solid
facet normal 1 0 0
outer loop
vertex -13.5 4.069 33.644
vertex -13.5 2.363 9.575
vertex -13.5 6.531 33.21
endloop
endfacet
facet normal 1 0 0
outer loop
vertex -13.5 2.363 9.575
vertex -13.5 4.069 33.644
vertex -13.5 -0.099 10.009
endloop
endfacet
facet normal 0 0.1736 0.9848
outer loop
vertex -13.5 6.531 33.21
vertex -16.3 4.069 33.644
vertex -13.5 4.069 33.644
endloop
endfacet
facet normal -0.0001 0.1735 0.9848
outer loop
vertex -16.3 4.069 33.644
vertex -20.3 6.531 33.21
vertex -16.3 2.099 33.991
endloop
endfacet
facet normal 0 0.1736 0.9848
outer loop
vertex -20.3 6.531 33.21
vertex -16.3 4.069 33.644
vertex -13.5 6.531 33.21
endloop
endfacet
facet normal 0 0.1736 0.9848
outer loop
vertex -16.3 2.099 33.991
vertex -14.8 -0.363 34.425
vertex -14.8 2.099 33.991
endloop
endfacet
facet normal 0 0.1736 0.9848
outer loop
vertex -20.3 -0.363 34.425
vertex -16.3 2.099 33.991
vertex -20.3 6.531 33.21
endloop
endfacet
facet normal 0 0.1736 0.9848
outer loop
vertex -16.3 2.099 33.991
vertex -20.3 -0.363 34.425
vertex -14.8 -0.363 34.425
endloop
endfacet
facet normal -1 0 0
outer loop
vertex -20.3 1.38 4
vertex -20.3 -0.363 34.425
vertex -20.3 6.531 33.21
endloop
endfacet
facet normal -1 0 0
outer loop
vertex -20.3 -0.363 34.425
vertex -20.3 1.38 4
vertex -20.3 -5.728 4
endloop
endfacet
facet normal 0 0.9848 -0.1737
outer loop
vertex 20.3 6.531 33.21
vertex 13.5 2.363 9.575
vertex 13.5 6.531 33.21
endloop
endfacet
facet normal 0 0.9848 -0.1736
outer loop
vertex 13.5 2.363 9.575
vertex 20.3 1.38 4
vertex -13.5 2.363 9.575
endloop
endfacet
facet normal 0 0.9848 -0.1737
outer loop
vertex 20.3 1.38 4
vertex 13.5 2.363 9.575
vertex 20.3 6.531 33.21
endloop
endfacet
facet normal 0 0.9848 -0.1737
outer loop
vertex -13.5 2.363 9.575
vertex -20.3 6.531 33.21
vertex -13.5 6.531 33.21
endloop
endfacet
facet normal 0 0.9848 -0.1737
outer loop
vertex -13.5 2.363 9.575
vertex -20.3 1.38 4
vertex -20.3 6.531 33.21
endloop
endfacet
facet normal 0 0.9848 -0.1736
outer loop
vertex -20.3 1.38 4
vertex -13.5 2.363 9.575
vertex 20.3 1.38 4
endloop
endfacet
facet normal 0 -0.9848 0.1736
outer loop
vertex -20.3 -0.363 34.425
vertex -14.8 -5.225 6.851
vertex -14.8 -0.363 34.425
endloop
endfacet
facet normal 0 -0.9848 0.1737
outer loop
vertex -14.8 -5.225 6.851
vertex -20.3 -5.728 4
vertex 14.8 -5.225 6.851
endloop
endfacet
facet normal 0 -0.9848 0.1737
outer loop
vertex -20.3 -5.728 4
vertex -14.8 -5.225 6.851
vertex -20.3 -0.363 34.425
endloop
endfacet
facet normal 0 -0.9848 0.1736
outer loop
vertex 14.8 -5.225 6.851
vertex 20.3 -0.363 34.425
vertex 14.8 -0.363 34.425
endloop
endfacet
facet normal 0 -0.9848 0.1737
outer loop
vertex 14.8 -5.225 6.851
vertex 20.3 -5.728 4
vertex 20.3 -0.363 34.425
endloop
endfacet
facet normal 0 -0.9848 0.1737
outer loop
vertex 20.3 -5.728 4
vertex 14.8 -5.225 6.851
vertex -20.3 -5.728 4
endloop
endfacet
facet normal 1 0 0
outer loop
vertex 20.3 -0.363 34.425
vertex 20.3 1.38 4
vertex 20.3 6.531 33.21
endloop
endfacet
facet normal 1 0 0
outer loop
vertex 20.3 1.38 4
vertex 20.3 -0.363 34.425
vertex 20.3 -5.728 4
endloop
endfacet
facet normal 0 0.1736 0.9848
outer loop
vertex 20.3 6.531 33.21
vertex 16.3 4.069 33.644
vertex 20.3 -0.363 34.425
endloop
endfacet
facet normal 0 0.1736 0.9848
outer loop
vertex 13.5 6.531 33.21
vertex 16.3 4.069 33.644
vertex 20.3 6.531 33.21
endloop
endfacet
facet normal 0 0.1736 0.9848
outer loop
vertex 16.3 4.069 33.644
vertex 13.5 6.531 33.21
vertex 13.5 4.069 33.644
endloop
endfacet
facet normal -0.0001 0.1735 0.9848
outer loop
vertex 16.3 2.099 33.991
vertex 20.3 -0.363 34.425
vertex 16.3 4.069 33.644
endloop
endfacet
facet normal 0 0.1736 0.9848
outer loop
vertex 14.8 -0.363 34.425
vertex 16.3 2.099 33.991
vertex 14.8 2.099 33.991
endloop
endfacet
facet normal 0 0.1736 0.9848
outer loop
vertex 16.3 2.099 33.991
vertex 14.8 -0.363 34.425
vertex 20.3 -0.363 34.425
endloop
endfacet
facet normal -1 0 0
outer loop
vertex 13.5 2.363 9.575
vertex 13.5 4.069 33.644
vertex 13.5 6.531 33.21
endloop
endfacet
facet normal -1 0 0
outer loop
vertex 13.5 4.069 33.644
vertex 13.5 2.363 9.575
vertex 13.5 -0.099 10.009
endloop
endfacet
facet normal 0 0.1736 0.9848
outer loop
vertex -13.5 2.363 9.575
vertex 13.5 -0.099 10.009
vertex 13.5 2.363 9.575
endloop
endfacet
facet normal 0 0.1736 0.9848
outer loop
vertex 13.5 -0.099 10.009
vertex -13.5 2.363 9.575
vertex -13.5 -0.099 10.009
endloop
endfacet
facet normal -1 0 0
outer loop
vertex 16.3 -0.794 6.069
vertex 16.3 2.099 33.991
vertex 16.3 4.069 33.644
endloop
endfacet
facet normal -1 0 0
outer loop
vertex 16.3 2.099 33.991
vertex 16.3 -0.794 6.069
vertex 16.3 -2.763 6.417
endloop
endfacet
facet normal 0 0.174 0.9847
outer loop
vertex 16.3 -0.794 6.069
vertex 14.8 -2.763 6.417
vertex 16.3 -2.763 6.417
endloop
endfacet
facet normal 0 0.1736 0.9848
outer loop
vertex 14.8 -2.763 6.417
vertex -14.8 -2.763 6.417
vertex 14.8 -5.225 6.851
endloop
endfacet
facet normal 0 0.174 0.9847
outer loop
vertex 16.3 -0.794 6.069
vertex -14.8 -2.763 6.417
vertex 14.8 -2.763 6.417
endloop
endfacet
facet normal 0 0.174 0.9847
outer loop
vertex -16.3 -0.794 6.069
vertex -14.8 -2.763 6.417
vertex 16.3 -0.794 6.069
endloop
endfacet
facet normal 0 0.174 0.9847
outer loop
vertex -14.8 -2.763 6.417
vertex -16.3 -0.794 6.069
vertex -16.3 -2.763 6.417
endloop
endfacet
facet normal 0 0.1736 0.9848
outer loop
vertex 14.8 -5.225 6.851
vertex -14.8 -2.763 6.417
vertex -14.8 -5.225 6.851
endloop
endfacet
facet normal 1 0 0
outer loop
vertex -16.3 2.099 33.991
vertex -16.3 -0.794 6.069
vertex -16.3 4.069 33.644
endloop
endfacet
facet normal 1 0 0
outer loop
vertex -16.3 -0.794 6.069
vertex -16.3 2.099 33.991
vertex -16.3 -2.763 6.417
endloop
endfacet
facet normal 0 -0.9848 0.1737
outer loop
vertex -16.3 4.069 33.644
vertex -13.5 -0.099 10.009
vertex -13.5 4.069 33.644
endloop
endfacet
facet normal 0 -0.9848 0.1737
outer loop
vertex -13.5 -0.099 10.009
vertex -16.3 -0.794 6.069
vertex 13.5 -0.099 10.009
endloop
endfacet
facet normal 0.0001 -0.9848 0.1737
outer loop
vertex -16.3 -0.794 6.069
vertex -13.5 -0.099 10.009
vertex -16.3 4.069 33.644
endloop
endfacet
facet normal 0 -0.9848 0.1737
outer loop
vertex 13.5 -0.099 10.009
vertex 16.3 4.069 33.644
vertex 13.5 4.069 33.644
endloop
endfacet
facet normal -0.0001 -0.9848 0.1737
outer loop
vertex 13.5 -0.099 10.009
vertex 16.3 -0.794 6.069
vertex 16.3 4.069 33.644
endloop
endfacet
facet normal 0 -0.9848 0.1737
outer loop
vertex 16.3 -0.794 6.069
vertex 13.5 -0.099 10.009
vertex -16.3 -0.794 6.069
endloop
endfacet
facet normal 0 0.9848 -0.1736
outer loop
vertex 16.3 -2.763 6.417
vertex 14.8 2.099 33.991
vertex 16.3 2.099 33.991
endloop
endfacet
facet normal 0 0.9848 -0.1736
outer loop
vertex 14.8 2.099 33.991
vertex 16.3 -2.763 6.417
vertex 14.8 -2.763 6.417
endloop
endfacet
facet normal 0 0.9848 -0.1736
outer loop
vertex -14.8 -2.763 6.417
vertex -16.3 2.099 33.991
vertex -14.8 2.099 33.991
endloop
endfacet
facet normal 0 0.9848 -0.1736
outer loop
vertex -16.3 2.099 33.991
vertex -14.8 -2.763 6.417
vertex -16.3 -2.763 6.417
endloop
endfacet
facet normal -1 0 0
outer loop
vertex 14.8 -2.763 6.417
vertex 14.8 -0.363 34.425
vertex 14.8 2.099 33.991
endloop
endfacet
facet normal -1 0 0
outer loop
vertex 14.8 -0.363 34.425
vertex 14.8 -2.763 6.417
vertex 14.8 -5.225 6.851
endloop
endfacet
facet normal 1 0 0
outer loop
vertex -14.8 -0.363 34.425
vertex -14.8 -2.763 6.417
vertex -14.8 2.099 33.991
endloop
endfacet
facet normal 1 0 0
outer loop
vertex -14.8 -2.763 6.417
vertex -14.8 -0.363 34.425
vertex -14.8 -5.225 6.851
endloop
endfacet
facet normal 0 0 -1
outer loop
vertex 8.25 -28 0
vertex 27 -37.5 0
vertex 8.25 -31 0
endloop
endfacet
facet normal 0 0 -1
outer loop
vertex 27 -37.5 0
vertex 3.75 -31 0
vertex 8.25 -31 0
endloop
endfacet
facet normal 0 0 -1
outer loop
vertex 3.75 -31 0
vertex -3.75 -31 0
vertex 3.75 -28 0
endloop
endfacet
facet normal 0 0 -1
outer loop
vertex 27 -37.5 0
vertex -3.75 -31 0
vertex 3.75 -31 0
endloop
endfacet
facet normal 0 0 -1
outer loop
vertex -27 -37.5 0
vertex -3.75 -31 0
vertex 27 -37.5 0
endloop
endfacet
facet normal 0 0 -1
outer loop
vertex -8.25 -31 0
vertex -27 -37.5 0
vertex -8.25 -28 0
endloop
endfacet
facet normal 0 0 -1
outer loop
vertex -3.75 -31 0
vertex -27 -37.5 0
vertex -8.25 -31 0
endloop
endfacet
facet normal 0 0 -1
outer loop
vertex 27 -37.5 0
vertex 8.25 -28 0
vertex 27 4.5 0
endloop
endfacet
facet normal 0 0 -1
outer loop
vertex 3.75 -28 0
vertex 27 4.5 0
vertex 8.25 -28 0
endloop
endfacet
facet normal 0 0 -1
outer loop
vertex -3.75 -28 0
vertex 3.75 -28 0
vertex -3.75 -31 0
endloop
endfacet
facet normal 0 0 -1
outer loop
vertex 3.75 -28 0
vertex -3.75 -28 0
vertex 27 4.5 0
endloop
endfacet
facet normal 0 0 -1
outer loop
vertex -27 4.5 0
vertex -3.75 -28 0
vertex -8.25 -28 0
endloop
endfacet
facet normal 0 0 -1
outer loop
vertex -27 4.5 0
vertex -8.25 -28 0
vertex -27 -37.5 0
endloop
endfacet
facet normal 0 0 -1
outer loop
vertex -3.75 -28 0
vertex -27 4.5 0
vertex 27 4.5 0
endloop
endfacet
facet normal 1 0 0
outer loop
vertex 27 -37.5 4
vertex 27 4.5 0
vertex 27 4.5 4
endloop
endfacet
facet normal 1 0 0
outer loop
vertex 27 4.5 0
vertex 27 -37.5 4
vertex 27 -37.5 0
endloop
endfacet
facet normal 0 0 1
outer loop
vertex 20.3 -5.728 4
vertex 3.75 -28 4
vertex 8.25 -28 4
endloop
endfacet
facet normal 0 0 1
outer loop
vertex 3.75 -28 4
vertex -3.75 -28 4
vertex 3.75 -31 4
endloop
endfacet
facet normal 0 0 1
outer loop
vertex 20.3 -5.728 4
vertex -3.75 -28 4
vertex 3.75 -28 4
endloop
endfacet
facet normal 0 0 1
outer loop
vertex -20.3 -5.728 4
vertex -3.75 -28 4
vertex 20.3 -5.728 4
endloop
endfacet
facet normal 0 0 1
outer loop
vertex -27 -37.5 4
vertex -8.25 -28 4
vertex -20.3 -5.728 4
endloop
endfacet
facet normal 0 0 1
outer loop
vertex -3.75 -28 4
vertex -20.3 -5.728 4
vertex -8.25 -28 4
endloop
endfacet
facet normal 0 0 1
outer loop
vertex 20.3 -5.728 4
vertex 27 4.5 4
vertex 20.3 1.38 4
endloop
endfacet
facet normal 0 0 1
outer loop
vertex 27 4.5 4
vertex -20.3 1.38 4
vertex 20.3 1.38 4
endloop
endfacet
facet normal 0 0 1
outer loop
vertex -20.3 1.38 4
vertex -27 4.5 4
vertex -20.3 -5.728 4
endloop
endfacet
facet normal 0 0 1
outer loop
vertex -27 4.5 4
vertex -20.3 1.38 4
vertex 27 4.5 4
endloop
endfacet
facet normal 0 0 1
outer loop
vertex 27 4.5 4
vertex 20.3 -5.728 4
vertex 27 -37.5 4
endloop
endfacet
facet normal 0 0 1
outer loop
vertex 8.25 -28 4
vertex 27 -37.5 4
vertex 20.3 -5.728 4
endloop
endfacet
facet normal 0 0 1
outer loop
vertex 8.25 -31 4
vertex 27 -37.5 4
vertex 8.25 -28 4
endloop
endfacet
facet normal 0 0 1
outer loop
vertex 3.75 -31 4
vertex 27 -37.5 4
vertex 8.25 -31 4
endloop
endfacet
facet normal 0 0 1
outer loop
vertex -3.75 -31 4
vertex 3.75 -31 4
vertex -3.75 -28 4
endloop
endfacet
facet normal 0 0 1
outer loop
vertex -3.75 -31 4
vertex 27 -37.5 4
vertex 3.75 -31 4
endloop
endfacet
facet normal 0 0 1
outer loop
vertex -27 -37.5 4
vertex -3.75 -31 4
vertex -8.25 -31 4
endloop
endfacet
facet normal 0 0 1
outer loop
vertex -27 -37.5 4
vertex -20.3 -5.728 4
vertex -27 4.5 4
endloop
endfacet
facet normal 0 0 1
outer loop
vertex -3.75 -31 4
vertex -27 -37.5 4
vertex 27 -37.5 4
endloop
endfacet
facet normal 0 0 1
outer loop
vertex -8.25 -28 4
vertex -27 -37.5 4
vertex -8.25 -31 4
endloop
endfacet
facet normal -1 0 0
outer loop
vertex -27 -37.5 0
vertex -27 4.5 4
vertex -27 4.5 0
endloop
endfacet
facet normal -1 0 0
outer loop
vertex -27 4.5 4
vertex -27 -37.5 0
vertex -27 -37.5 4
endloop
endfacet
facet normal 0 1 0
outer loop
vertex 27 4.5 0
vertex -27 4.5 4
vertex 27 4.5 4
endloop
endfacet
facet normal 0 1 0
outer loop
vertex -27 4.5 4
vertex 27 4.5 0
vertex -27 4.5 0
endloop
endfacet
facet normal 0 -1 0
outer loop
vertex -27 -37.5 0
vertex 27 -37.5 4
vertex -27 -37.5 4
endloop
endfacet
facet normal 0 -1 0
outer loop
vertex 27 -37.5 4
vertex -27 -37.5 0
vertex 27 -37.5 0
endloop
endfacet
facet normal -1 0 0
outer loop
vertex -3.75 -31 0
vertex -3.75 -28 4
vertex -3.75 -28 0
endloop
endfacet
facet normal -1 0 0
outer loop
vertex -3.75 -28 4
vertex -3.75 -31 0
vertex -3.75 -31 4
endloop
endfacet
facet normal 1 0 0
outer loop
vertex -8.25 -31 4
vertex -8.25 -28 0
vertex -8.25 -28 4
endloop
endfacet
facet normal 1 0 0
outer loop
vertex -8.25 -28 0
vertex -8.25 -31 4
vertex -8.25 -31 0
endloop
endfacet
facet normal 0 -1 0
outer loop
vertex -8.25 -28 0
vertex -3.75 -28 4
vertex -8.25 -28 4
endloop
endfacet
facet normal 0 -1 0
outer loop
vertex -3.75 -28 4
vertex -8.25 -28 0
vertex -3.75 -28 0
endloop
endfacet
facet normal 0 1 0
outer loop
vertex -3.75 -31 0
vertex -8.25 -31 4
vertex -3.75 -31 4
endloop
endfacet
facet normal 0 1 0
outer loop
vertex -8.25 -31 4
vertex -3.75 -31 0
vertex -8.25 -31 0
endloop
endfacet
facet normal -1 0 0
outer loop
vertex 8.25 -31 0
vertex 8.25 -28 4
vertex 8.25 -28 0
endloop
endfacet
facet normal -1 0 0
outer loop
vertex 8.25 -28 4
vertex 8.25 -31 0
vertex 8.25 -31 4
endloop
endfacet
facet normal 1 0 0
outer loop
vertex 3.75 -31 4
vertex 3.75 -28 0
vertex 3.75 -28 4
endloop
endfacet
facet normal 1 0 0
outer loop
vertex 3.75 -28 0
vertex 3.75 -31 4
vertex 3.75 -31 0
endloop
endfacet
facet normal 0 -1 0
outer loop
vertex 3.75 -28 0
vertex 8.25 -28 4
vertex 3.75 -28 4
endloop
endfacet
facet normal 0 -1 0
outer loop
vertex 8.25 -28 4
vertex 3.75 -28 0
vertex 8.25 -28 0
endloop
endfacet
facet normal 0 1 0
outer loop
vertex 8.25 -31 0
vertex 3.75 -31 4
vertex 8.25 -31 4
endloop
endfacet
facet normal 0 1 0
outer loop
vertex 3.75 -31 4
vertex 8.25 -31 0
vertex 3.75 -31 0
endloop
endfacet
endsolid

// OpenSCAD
// Boris — support caméra latérale (InnoMaker U20CAM-720P, carte ~32x32 mm)
//
// v1 : une seule pièce, angle de plongée fixé à l'impression (imprimer 2-3 angles).
// v2 : deux pièces, berceau qui pivote sur 2 vis M3 latérales (réglage à la main,
//      serrage par friction).
//
// Principe commun : la carte caméra glisse par le haut dans deux rails rainurés
// (aucune vis dans la carte, aucun trou de fixation à connaître). Le câble est
// bridé au socle par un collier passé dans deux fentes, pour qu'il ne tire pas
// sur la carte.
//
// Repère : X = largeur, Y = axe de visée (objectif vers +Y), Z = hauteur.
// Export : openscad -D 'part="v1"' -D tilt=10 -o v1.stl side_camera_mount.scad

/* [Sélection] */
part = "v1";          // "v1" | "v2_base" | "v2_cradle" | "v2_assembly"
tilt = 10;            // v1 : plongée de l'objectif vers le bas, en degrés (0 = horizontal)

/* [Caméra — À MESURER] */
pcb_w = 32.0;         // largeur carte (X)          — fiche revendeur : 32x32, ASSUMED
pcb_h = 32.0;         // hauteur carte (Z)
pcb_t = 1.6;          // épaisseur carte            — standard, ASSUMED
lens_off_z = 0;       // décalage vertical objectif / centre carte (+ = vers le haut)

/* [Position] */
lens_z_v1 = 22;       // hauteur du centre optique au-dessus de la table (v1)
lens_z_v2 = 24;       // idem v2 (un peu plus haut pour laisser pivoter le berceau)

/* [Rails] */
slot_clear  = 0.4;    // jeu sur l'épaisseur de carte (0.3 = serré, 0.6 = libre)
side_clear  = 0.3;    // jeu latéral par côté
groove_d    = 2.5;    // la carte entre de 2.5 mm dans chaque rail (côté objectif)
back_cover  = 1.2;    // la lèvre arrière ne recouvre que 1.2 mm (dégage le connecteur)
lip         = 2.5;    // épaisseur des lèvres avant/arrière (Y)
floor_t     = 2.0;    // épaisseur sous la carte
rail_h      = 28;     // hauteur des rails (au-dessus du bord bas de la carte)
bottom_lip  = 4;      // hauteur de la lèvre basse avant (ne doit pas masquer l'objectif)

/* [Socle] */
base_w  = 54;
base_d  = 42;
base_t  = 4;
tie_w   = 4.5;        // fente collier (largeur)
tie_l   = 3;          // fente collier (épaisseur)

/* [v2 pivot] */
side_wall_v2 = 7;     // épaisseur des rails v2 (logent la vis M3)
m3_pilot = 2.7;       // trou pilote auto-taraudage M3 dans le berceau
m3_clear = 3.4;       // trou de passage M3 dans les oreilles
ear_t    = 4;
ear_gap  = 0.4;       // jeu oreille / berceau par côté

$fn = 40;
eps = 0.01;

slot_w = pcb_t + slot_clear;
side_wall_v1 = 4;

// ---------------------------------------------------------------------------
// Berceau, repère local : carte entre y=0 et y=slot_w, bord bas à z=0, centrée en X.
module cradle(side_wall, pedestal = 0) {
    half_in = pcb_w / 2 + side_clear;          // fond de rainure
    half_out = half_in + side_wall;
    difference() {
        union() {
            // rails
            for (s = [-1, 1])
                translate([s > 0 ? pcb_w / 2 - groove_d : -half_out, -lip, -floor_t - pedestal])
                    cube([half_out - (pcb_w / 2 - groove_d), slot_w + 2 * lip, rail_h + floor_t + pedestal]);
            // traverse basse
            translate([-half_out, -lip, -floor_t - pedestal])
                cube([2 * half_out, slot_w + 2 * lip, floor_t + pedestal + bottom_lip]);
        }
        // rainure de la carte
        translate([-half_in, 0, 0]) cube([2 * half_in, slot_w, rail_h + 1]);
        // la lèvre arrière ne recouvre que back_cover mm de chaque bord
        translate([-(pcb_w / 2 - back_cover), -lip - eps, 0])
            cube([pcb_w - 2 * back_cover, lip + 2 * eps, rail_h + 1]);
        // fenêtre avant entre les rails, au-dessus de la lèvre basse
        translate([-(pcb_w / 2 - groove_d), slot_w - eps, bottom_lip])
            cube([pcb_w - 2 * groove_d, lip + 2 * eps, rail_h]);
    }
}

// fentes pour collier de serrage (bridage du câble), derrière le berceau
module tie_slots(y) {
    for (s = [-1, 1])
        translate([s * 6 - tie_w / 2, y - tie_l / 2, -1]) cube([tie_w, tie_l, base_t + 2]);
}

module base_plate(y_front) {
    translate([-base_w / 2, y_front - base_d, 0])
        cube([base_w, base_d, base_t]);
}

// ---------------------------------------------------------------------------
// v1 : monobloc à angle fixe
module v1() {
    lz = lens_z_v1;
    y_front = slot_w + lip;                    // socle affleurant l'avant du berceau
    pz = pcb_h / 2 + lens_off_z;               // hauteur de l'objectif dans le berceau
    difference() {
        union() {
            base_plate(y_front);
            intersection() {
                // pivot autour du centre optique : lens_z reste exact quel que soit tilt
                translate([0, slot_w / 2, lz])
                    rotate([-tilt, 0, 0])
                        translate([0, -slot_w / 2, -pz])
                            cradle(side_wall_v1, pedestal = 40);
                translate([-100, -100, 0]) cube([200, 200, 200]);
            }
        }
        tie_slots(y_front - base_d + 8);
    }
}

// ---------------------------------------------------------------------------
// v2 : berceau pivotant (imprimé debout, traverse sur le plateau)
module v2_cradle() {
    pz = pcb_h / 2 + lens_off_z;
    half_out = pcb_w / 2 + side_clear + side_wall_v2;
    difference() {
        translate([0, 0, floor_t]) cradle(side_wall_v2);
        // trous pilotes M3 sur l'axe du centre optique
        for (s = [-1, 1])
            translate([s * (half_out + eps), slot_w / 2, floor_t + pz])
                rotate([0, s * -90, 0]) cylinder(d = m3_pilot, h = side_wall_v2 - 1);
    }
}

module v2_base() {
    lz = lens_z_v2;
    half_out = pcb_w / 2 + side_clear + side_wall_v2;
    ear_x = half_out + ear_gap;
    ear_d = 14;
    y_front = slot_w / 2 + ear_d / 2;
    difference() {
        union() {
            base_plate(y_front);
            for (s = [-1, 1])
                translate([s > 0 ? ear_x : -ear_x - ear_t, slot_w / 2, 0])
                    hull() {
                        translate([0, -ear_d / 2, 0]) cube([ear_t, ear_d, base_t]);
                        translate([0, 0, lz]) rotate([0, 90, 0]) cylinder(d = ear_d, h = ear_t);
                    }
        }
        for (s = [-1, 1])
            translate([s > 0 ? ear_x - 1 : -ear_x - ear_t - 1, slot_w / 2, lz])
                rotate([0, 90, 0]) cylinder(d = m3_clear, h = ear_t + 2);
        tie_slots(y_front - base_d + 8);
    }
}

module v2_assembly() {
    pz = pcb_h / 2 + lens_off_z;
    v2_base();
    color("orange")
        translate([0, slot_w / 2, lens_z_v2])
            rotate([-tilt, 0, 0])
                translate([0, -slot_w / 2, -pz - floor_t]) v2_cradle();
    // carte fantôme, pour vérification visuelle
    %translate([0, slot_w / 2, lens_z_v2]) rotate([-tilt, 0, 0])
        translate([-pcb_w / 2, -pcb_t / 2, -pz]) cube([pcb_w, pcb_t, pcb_h]);
}

if (part == "v1") v1();
else if (part == "v2_base") v2_base();
else if (part == "v2_cradle") v2_cradle();
else if (part == "v2_assembly") v2_assembly();
